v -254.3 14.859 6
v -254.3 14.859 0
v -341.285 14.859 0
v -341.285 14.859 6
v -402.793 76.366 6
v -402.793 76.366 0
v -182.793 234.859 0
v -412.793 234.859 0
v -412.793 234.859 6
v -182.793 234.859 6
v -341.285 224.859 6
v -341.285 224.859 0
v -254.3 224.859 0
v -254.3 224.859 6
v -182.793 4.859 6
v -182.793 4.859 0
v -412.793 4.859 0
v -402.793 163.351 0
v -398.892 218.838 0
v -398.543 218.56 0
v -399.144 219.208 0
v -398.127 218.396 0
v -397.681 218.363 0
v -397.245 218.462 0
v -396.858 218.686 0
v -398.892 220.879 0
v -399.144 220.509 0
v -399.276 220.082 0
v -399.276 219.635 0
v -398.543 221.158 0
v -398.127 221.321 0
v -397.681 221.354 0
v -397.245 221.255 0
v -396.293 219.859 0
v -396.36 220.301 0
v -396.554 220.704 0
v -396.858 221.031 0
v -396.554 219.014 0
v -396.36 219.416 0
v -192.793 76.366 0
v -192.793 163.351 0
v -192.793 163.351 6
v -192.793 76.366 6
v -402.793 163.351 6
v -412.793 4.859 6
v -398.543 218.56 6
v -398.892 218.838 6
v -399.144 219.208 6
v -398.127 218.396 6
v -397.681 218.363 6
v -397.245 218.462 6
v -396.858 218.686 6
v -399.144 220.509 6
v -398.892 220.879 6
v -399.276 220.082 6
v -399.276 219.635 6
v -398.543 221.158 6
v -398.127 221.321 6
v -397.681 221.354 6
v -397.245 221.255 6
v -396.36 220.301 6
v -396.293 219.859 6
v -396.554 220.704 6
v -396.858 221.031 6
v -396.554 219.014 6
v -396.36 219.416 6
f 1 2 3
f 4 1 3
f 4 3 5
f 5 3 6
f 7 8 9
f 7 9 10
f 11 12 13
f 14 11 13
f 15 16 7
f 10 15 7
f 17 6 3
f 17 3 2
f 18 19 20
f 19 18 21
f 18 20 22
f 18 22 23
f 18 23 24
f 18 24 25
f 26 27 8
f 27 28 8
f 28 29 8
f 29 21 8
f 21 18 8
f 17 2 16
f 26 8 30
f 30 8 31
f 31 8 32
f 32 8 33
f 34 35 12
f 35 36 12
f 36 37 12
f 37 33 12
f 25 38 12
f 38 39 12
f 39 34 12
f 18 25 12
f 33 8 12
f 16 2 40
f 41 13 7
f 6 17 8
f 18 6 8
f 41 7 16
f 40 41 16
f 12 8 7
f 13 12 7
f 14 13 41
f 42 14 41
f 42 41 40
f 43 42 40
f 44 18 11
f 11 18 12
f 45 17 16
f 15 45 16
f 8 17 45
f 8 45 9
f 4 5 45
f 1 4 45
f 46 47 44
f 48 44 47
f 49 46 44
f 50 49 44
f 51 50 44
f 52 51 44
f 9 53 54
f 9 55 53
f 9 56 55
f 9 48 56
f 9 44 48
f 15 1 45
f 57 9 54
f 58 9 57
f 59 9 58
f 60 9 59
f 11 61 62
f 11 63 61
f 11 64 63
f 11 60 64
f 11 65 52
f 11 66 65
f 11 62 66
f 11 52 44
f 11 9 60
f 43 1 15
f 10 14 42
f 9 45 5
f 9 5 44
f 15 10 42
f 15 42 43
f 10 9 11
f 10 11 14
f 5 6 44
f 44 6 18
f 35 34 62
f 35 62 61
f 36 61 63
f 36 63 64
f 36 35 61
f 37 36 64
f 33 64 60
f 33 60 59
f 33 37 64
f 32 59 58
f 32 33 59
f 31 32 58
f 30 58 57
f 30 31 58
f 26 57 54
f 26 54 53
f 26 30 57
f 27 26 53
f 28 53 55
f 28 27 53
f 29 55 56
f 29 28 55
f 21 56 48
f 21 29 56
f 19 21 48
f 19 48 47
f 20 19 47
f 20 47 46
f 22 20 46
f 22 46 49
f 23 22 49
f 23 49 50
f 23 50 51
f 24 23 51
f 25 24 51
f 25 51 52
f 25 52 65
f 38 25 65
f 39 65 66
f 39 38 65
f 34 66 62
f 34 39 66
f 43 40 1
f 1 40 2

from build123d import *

# Parameters (mm, degrees)
F0_W     = 230
F0_H     = 230
F0_R     = 1.5
F1_DEPTH = 6


with BuildPart() as f1:
    # F0 (on Top) → F1 (new body)
    with BuildSketch(Plane.XY):
        with Locations((-297.792881, 119.858589)):
            Rectangle(F0_W, F0_H)
        with Locations((-397.792881, 219.858589)):
            Circle(F0_R, mode=Mode.SUBTRACT)
        Polygon((-402.792881, 163.351013), (-341.285305, 224.858589), (-254.300457, 224.858589), (-192.792881, 163.351013), (-192.792881, 76.366165), (-254.300457, 14.858589), (-341.285305, 14.858589), (-402.792881, 76.366165), align=None, mode=Mode.SUBTRACT)
    extrude(amount=F1_DEPTH)


solid = f1.part
